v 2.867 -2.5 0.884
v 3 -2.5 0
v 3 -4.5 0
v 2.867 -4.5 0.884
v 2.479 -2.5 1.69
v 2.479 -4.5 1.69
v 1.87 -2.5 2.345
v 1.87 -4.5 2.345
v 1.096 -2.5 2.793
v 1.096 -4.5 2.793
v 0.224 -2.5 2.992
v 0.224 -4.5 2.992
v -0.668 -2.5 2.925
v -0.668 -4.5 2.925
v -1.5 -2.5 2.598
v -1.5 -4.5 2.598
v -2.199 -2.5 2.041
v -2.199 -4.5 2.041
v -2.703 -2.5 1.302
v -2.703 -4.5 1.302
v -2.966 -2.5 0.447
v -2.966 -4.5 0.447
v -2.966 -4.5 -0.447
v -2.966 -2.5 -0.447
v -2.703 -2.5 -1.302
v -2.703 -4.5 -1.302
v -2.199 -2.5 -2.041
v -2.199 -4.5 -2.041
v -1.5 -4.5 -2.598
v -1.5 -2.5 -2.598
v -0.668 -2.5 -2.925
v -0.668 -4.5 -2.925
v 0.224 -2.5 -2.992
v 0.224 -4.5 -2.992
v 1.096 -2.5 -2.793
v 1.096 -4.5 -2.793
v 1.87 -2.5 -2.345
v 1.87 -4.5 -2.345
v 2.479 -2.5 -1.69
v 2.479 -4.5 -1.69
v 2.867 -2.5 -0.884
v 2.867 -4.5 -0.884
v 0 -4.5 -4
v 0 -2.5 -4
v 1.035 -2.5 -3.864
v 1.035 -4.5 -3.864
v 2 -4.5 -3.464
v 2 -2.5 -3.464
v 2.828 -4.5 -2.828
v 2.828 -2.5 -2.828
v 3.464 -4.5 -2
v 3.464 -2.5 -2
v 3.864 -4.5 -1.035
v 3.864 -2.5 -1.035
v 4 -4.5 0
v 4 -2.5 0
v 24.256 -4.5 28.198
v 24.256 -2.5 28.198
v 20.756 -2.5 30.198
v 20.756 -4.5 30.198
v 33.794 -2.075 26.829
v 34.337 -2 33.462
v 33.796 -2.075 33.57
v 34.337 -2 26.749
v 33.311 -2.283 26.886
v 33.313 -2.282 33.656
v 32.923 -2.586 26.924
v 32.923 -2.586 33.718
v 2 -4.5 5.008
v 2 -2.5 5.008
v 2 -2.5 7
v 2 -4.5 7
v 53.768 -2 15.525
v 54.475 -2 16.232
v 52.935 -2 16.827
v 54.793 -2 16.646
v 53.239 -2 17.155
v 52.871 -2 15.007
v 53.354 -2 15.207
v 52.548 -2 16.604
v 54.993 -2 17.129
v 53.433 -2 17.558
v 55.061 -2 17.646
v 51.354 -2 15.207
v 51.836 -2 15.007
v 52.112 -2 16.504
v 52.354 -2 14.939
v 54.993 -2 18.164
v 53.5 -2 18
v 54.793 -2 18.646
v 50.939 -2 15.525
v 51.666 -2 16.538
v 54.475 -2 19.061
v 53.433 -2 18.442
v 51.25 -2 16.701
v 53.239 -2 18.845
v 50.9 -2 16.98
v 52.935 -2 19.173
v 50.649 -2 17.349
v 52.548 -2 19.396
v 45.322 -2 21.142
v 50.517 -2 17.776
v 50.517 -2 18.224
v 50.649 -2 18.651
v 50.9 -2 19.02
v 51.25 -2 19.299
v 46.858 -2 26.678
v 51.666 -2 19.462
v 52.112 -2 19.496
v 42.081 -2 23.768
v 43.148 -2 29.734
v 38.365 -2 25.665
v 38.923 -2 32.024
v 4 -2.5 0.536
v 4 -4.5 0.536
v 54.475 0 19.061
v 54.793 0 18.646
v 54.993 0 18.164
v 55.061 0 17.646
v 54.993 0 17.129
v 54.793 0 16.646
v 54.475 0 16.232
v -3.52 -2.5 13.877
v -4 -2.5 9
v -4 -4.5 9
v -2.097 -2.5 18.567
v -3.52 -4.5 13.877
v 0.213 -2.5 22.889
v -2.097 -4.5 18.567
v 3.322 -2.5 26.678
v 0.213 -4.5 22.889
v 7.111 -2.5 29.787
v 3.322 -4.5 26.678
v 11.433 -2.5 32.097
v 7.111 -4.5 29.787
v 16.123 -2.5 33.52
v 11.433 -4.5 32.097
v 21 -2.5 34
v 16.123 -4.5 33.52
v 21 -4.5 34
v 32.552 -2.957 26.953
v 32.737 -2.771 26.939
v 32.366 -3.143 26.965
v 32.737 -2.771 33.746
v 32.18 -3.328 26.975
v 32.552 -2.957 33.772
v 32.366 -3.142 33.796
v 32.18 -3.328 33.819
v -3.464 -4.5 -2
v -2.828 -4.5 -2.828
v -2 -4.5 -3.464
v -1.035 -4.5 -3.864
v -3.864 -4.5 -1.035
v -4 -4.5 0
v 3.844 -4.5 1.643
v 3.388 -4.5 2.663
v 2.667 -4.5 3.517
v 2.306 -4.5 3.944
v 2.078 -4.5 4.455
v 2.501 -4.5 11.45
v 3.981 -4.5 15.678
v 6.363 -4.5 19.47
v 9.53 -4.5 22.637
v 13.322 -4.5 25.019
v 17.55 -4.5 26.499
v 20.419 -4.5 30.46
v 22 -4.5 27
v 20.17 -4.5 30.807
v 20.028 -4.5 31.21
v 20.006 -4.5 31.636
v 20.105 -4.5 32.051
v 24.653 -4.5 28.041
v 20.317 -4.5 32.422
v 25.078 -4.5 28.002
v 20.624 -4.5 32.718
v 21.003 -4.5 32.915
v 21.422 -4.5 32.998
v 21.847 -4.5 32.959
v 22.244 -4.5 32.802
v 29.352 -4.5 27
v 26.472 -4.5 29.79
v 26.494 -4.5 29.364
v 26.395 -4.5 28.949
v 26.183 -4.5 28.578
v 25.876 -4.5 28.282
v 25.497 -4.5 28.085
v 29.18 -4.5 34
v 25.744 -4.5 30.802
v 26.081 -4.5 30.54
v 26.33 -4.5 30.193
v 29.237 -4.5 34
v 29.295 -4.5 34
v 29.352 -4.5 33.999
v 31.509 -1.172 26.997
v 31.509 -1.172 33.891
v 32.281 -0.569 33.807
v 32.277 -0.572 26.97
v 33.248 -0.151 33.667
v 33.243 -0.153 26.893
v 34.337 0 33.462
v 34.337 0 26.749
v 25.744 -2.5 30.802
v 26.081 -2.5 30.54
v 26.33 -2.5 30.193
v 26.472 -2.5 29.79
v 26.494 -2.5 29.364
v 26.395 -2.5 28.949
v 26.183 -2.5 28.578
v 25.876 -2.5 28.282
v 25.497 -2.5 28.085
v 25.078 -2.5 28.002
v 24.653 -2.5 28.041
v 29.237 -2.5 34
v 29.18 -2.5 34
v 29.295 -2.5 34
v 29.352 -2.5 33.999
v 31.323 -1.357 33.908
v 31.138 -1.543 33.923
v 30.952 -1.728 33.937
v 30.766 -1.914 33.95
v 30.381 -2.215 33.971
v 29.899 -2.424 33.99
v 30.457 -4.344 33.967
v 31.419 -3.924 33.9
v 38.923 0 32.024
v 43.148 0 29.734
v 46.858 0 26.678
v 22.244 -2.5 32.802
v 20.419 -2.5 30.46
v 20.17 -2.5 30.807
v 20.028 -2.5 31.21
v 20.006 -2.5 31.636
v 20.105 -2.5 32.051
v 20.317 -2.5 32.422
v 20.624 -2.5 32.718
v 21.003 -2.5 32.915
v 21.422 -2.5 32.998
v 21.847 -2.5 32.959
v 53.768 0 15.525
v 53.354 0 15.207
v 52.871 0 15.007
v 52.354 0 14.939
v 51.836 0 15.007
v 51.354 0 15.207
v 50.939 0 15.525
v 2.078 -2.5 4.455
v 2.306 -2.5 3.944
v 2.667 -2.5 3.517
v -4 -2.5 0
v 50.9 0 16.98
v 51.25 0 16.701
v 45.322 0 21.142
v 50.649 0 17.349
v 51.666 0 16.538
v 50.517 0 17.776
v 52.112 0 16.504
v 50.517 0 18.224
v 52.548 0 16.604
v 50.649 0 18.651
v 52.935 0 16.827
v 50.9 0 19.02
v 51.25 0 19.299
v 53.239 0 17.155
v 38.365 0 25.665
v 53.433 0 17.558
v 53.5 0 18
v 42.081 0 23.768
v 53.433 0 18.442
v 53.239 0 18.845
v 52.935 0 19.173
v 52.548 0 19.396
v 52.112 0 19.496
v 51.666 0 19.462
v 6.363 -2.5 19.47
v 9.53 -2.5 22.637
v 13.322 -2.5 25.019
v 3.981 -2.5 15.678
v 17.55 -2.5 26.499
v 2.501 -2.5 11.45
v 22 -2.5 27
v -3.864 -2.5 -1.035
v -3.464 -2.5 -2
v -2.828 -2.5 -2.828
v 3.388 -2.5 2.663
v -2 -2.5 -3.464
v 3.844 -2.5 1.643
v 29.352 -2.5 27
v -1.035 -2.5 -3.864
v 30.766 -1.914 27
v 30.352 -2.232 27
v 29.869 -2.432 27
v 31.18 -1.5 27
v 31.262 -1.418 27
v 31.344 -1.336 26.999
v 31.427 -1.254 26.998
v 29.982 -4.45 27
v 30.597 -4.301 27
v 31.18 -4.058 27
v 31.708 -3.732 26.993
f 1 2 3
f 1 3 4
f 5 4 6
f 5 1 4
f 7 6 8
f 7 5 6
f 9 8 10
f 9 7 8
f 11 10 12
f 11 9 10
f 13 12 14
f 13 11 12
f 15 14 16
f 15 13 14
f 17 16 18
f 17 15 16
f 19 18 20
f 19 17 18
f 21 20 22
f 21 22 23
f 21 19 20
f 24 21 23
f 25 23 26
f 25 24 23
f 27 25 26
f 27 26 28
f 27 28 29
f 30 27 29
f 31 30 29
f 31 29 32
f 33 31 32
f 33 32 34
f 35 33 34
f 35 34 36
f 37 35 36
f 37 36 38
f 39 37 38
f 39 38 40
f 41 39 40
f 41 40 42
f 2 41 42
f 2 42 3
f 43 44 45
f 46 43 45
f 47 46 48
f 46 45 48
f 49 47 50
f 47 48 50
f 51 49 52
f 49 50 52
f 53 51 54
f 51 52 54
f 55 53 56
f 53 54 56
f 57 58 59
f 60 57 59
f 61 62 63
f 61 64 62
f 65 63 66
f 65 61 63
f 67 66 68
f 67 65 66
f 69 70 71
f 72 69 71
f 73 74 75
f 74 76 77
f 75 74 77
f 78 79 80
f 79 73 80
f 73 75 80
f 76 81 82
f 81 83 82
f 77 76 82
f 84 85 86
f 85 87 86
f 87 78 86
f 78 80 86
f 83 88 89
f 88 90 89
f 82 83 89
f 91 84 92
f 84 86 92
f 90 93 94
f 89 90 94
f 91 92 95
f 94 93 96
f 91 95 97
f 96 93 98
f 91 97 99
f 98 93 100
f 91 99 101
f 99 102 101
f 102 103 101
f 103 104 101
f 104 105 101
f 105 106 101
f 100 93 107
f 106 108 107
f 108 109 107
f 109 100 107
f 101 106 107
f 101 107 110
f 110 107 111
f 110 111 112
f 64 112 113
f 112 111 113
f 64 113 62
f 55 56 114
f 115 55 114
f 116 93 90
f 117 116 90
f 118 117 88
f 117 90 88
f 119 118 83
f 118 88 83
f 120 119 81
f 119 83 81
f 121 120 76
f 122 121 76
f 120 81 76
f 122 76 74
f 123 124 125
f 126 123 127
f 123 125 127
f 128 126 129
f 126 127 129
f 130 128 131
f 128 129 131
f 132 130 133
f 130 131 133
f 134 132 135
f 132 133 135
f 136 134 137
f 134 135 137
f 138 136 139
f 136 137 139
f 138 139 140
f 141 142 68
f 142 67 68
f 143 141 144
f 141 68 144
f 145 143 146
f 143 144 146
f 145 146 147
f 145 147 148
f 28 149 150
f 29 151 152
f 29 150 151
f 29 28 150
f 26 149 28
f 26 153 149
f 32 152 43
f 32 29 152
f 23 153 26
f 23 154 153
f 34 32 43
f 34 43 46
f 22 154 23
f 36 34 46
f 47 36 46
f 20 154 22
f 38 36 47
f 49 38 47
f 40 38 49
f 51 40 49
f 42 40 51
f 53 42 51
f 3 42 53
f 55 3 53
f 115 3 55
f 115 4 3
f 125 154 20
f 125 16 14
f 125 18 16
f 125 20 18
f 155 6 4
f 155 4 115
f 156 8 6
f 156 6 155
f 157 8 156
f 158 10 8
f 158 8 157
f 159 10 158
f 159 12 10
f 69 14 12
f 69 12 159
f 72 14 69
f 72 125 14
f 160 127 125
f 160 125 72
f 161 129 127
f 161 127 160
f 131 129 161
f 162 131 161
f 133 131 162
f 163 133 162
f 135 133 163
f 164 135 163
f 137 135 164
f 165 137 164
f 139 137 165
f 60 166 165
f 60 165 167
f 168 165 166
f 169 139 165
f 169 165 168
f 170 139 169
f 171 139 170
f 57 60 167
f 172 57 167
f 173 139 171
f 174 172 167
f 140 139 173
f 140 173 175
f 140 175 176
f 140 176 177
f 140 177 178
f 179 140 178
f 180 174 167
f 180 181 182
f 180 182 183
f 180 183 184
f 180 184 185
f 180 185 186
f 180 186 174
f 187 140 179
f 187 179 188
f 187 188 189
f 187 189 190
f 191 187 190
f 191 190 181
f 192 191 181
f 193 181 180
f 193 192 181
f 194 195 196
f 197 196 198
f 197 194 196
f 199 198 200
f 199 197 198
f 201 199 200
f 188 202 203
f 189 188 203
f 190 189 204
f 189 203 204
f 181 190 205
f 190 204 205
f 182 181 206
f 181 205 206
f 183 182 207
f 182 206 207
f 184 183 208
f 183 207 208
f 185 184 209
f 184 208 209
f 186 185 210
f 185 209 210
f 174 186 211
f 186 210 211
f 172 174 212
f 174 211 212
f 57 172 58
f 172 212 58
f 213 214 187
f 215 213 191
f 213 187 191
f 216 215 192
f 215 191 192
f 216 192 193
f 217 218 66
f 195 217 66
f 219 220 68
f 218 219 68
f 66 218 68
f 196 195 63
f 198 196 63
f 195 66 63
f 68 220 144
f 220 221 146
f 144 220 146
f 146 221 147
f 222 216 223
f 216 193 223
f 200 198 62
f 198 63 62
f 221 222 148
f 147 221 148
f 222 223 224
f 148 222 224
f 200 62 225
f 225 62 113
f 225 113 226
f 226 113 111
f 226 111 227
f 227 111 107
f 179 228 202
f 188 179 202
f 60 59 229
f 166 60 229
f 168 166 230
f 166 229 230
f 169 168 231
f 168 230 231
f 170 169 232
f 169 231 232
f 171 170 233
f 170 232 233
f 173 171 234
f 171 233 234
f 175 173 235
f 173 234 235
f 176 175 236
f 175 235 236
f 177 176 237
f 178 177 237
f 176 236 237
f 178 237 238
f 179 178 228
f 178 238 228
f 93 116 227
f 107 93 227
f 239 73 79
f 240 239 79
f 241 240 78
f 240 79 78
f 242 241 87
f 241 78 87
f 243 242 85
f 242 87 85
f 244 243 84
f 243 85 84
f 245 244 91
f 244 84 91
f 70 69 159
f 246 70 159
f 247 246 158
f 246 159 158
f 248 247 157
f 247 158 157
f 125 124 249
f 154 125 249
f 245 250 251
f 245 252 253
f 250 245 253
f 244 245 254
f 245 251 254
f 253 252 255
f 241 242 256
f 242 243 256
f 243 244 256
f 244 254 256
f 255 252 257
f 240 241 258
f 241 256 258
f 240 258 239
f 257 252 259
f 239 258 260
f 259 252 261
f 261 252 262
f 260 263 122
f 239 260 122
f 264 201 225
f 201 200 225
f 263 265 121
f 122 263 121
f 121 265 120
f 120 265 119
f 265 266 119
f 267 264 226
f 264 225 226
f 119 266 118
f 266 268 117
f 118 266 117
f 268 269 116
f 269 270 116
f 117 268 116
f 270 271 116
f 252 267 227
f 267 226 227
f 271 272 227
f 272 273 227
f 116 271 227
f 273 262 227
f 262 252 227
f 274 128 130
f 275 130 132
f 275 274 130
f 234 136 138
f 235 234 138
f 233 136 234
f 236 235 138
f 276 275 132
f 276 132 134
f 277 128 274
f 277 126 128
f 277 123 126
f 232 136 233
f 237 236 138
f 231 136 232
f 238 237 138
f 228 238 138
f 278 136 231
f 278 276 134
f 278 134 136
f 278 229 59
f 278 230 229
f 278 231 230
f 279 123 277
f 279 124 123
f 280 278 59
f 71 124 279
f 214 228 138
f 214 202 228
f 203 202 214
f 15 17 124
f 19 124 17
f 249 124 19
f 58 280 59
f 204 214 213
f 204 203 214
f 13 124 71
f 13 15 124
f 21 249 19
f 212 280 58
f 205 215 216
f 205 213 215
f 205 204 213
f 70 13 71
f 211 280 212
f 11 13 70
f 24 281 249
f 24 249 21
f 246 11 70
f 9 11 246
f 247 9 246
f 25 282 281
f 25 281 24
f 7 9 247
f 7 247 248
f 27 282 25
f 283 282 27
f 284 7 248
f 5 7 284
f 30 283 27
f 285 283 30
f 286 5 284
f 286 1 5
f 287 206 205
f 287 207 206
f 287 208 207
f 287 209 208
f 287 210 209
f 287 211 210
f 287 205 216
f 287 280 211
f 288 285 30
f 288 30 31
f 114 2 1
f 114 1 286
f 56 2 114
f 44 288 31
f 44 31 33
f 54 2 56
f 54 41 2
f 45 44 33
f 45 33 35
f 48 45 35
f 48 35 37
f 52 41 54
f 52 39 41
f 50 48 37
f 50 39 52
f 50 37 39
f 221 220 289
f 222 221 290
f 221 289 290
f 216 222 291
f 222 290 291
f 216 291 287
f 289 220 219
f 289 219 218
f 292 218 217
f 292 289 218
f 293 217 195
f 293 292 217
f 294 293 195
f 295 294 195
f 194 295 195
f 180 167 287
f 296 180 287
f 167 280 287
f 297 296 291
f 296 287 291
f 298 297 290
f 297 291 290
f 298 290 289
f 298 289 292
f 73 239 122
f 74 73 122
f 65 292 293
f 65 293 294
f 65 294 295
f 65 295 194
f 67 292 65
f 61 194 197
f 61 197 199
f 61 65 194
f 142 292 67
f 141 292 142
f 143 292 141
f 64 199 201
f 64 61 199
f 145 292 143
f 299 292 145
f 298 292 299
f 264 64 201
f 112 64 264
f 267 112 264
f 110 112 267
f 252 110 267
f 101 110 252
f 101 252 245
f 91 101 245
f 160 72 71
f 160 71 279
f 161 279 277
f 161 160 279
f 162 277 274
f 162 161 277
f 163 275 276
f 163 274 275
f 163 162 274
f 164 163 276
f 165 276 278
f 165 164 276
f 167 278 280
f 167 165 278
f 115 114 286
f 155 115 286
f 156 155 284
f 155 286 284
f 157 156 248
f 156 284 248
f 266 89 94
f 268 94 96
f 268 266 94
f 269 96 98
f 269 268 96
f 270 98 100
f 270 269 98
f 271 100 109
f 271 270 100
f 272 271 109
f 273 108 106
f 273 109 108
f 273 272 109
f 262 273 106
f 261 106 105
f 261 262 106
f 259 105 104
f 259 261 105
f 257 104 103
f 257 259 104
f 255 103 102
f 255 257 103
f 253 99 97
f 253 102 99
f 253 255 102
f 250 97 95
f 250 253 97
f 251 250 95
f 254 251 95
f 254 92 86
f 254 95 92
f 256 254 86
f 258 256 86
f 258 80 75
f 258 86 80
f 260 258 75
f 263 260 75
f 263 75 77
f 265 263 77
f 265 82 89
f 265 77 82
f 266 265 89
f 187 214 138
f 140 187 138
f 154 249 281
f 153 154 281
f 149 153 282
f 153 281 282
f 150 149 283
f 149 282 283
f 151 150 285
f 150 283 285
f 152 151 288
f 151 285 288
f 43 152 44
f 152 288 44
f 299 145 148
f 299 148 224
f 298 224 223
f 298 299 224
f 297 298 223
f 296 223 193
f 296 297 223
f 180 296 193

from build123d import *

# Parameters (mm, degrees)
F0_R        = 3
F0_R_2      = 1.5
F1_DEPTH    = 4.5
F2_R        = 20
F3_R        = 25
F4_R        = 25
F5_T1_DEPTH = 24.5
F5_T3_DEPTH = 21.8205080757
F6_R        = 2
F8_DEPTH    = 50
F9_R        = 2
F10_R       = 4


# Not quite as in the source:
# - a fillet or chamfer that OpenCascade refuses, or shapes differently, is made with other operations: its cross-section is extruded or revolved along the edge and cut away or added
# - a feature names something its author has since deleted; it is built from what else it names


with BuildPart() as f1:
    # F0 (on Front) → F1 (new body)
    with BuildSketch(Plane.XZ):
        Polygon((-4, 27), (-4, -4), (4, -4), (4, 4), (2, 4), (2, 27), align=None)
        Circle(F0_R, mode=Mode.SUBTRACT)
        Polygon((-4, 34), (-4, 27), (2, 27), (4, 27), (39.4644660941, 27), (52.3535533906, 14.1109127035), (55.8890872965, 17.6464466094), (39.5355339059, 34), align=None)
        with BuildLine():
            ThreePointArc((25.7442084075, 30.8023647132), (26.3023647132, 28.7557915925), (24.2557915925, 28.1976352868))
            Line((24.2557915925, 28.1976352868), (20.7557915925, 30.1976352868))
            ThreePointArc((20.7557915925, 30.1976352868), (20.1976352868, 32.2442084075), (22.2442084075, 32.8023647132))
            Line((22.2442084075, 32.8023647132), (25.7442084075, 30.8023647132))
        make_face(mode=Mode.SUBTRACT)
        with Locations((52, 18)):
            Circle(F0_R_2, mode=Mode.SUBTRACT)
    extrude(amount=F1_DEPTH)

    # F2
    f2_edges = [f1.edges().sort_by_distance(p)[0] for p in [
        (39.464466, -2.25, 27),
        (2, -2.25, 27),
    ]]
    fillet(f2_edges, radius=F2_R)

    # F3
    f3_edges = [f1.edges().sort_by_distance(p)[0] for p in [
        (-4, -2.25, 34),
    ]]
    fillet(f3_edges, radius=F3_R)

    # F4
    f4_edges = [f1.edges().sort_by_distance(p)[0] for p in [
        (39.535534, -2.25, 34),
    ]]
    fillet(f4_edges, radius=F4_R)

    # F5: fillet of radius 4 on 3 edges, made by hand

    # F5_s2 → F5_t1 (cut)
    with BuildSketch(Plane.XZ.offset(-10)):
        with BuildLine():
            ThreePointArc((0, -4), (2.8284271247, -2.8284271247), (4, 0))
            Line((4, 0), (4, -4))
            Line((4, -4), (0, -4))
        make_face()
        with BuildLine():
            ThreePointArc((-4, 0), (-2.8284271247, -2.8284271247), (0, -4))
            Line((0, -4), (-4, -4))
            Line((-4, -4), (-4, 0))
        make_face()
    extrude(amount=F5_T1_DEPTH, mode=Mode.SUBTRACT)

    # F5_s4 → F5_t3 (cut)
    with BuildSketch(Plane.XZ.offset(-8.6602540378)):
        with BuildLine():
            ThreePointArc((4, 0.5358983849), (3.4641016151, 2.5358983849), (2, 4))
            Line((2, 4), (4, 4))
            Line((4, 4), (4, 0.5358983849))
        make_face()
    extrude(amount=F5_T3_DEPTH, mode=Mode.SUBTRACT)

    # F6
    f6_edges = [f1.edges().sort_by_distance(p)[0] for p in [
        (2, -2.25, 4),
        (52.353553, -2.25, 14.110913),
        (55.889087, -2.25, 17.646447),
    ]]
    fillet(f6_edges, radius=F6_R)

    # F7 (on Top) → F8 (cut, symmetric)
    with BuildSketch(Plane.XY):
        Polygon((34.1801948466, 1.5), (-25.8198051534, 1.5), (-25.8198051534, -2.5), (30.1801948466, -2.5), align=None)
        Polygon((33.5086219714, -2), (29.5086219714, -6), (69.5086219714, -6), (69.5086219714, -2), align=None)
    extrude(amount=F8_DEPTH, both=True, mode=Mode.SUBTRACT)

    # F9
    f9_edges = [f1.edges().sort_by_distance(p)[0] for p in [
        (33.508622, -2, 30.243221),
        (30.180195, -2.5, 30.489996),
    ]]
    fillet(f9_edges, radius=F9_R)

    # F10
    f10_edges = [f1.edges().sort_by_distance(p)[0] for p in [
        (31.008622, -4.5, 30.466524),
        (32.680195, 0, 30.348729),
    ]]
    fillet(f10_edges, radius=F10_R)


solid = f1.part
